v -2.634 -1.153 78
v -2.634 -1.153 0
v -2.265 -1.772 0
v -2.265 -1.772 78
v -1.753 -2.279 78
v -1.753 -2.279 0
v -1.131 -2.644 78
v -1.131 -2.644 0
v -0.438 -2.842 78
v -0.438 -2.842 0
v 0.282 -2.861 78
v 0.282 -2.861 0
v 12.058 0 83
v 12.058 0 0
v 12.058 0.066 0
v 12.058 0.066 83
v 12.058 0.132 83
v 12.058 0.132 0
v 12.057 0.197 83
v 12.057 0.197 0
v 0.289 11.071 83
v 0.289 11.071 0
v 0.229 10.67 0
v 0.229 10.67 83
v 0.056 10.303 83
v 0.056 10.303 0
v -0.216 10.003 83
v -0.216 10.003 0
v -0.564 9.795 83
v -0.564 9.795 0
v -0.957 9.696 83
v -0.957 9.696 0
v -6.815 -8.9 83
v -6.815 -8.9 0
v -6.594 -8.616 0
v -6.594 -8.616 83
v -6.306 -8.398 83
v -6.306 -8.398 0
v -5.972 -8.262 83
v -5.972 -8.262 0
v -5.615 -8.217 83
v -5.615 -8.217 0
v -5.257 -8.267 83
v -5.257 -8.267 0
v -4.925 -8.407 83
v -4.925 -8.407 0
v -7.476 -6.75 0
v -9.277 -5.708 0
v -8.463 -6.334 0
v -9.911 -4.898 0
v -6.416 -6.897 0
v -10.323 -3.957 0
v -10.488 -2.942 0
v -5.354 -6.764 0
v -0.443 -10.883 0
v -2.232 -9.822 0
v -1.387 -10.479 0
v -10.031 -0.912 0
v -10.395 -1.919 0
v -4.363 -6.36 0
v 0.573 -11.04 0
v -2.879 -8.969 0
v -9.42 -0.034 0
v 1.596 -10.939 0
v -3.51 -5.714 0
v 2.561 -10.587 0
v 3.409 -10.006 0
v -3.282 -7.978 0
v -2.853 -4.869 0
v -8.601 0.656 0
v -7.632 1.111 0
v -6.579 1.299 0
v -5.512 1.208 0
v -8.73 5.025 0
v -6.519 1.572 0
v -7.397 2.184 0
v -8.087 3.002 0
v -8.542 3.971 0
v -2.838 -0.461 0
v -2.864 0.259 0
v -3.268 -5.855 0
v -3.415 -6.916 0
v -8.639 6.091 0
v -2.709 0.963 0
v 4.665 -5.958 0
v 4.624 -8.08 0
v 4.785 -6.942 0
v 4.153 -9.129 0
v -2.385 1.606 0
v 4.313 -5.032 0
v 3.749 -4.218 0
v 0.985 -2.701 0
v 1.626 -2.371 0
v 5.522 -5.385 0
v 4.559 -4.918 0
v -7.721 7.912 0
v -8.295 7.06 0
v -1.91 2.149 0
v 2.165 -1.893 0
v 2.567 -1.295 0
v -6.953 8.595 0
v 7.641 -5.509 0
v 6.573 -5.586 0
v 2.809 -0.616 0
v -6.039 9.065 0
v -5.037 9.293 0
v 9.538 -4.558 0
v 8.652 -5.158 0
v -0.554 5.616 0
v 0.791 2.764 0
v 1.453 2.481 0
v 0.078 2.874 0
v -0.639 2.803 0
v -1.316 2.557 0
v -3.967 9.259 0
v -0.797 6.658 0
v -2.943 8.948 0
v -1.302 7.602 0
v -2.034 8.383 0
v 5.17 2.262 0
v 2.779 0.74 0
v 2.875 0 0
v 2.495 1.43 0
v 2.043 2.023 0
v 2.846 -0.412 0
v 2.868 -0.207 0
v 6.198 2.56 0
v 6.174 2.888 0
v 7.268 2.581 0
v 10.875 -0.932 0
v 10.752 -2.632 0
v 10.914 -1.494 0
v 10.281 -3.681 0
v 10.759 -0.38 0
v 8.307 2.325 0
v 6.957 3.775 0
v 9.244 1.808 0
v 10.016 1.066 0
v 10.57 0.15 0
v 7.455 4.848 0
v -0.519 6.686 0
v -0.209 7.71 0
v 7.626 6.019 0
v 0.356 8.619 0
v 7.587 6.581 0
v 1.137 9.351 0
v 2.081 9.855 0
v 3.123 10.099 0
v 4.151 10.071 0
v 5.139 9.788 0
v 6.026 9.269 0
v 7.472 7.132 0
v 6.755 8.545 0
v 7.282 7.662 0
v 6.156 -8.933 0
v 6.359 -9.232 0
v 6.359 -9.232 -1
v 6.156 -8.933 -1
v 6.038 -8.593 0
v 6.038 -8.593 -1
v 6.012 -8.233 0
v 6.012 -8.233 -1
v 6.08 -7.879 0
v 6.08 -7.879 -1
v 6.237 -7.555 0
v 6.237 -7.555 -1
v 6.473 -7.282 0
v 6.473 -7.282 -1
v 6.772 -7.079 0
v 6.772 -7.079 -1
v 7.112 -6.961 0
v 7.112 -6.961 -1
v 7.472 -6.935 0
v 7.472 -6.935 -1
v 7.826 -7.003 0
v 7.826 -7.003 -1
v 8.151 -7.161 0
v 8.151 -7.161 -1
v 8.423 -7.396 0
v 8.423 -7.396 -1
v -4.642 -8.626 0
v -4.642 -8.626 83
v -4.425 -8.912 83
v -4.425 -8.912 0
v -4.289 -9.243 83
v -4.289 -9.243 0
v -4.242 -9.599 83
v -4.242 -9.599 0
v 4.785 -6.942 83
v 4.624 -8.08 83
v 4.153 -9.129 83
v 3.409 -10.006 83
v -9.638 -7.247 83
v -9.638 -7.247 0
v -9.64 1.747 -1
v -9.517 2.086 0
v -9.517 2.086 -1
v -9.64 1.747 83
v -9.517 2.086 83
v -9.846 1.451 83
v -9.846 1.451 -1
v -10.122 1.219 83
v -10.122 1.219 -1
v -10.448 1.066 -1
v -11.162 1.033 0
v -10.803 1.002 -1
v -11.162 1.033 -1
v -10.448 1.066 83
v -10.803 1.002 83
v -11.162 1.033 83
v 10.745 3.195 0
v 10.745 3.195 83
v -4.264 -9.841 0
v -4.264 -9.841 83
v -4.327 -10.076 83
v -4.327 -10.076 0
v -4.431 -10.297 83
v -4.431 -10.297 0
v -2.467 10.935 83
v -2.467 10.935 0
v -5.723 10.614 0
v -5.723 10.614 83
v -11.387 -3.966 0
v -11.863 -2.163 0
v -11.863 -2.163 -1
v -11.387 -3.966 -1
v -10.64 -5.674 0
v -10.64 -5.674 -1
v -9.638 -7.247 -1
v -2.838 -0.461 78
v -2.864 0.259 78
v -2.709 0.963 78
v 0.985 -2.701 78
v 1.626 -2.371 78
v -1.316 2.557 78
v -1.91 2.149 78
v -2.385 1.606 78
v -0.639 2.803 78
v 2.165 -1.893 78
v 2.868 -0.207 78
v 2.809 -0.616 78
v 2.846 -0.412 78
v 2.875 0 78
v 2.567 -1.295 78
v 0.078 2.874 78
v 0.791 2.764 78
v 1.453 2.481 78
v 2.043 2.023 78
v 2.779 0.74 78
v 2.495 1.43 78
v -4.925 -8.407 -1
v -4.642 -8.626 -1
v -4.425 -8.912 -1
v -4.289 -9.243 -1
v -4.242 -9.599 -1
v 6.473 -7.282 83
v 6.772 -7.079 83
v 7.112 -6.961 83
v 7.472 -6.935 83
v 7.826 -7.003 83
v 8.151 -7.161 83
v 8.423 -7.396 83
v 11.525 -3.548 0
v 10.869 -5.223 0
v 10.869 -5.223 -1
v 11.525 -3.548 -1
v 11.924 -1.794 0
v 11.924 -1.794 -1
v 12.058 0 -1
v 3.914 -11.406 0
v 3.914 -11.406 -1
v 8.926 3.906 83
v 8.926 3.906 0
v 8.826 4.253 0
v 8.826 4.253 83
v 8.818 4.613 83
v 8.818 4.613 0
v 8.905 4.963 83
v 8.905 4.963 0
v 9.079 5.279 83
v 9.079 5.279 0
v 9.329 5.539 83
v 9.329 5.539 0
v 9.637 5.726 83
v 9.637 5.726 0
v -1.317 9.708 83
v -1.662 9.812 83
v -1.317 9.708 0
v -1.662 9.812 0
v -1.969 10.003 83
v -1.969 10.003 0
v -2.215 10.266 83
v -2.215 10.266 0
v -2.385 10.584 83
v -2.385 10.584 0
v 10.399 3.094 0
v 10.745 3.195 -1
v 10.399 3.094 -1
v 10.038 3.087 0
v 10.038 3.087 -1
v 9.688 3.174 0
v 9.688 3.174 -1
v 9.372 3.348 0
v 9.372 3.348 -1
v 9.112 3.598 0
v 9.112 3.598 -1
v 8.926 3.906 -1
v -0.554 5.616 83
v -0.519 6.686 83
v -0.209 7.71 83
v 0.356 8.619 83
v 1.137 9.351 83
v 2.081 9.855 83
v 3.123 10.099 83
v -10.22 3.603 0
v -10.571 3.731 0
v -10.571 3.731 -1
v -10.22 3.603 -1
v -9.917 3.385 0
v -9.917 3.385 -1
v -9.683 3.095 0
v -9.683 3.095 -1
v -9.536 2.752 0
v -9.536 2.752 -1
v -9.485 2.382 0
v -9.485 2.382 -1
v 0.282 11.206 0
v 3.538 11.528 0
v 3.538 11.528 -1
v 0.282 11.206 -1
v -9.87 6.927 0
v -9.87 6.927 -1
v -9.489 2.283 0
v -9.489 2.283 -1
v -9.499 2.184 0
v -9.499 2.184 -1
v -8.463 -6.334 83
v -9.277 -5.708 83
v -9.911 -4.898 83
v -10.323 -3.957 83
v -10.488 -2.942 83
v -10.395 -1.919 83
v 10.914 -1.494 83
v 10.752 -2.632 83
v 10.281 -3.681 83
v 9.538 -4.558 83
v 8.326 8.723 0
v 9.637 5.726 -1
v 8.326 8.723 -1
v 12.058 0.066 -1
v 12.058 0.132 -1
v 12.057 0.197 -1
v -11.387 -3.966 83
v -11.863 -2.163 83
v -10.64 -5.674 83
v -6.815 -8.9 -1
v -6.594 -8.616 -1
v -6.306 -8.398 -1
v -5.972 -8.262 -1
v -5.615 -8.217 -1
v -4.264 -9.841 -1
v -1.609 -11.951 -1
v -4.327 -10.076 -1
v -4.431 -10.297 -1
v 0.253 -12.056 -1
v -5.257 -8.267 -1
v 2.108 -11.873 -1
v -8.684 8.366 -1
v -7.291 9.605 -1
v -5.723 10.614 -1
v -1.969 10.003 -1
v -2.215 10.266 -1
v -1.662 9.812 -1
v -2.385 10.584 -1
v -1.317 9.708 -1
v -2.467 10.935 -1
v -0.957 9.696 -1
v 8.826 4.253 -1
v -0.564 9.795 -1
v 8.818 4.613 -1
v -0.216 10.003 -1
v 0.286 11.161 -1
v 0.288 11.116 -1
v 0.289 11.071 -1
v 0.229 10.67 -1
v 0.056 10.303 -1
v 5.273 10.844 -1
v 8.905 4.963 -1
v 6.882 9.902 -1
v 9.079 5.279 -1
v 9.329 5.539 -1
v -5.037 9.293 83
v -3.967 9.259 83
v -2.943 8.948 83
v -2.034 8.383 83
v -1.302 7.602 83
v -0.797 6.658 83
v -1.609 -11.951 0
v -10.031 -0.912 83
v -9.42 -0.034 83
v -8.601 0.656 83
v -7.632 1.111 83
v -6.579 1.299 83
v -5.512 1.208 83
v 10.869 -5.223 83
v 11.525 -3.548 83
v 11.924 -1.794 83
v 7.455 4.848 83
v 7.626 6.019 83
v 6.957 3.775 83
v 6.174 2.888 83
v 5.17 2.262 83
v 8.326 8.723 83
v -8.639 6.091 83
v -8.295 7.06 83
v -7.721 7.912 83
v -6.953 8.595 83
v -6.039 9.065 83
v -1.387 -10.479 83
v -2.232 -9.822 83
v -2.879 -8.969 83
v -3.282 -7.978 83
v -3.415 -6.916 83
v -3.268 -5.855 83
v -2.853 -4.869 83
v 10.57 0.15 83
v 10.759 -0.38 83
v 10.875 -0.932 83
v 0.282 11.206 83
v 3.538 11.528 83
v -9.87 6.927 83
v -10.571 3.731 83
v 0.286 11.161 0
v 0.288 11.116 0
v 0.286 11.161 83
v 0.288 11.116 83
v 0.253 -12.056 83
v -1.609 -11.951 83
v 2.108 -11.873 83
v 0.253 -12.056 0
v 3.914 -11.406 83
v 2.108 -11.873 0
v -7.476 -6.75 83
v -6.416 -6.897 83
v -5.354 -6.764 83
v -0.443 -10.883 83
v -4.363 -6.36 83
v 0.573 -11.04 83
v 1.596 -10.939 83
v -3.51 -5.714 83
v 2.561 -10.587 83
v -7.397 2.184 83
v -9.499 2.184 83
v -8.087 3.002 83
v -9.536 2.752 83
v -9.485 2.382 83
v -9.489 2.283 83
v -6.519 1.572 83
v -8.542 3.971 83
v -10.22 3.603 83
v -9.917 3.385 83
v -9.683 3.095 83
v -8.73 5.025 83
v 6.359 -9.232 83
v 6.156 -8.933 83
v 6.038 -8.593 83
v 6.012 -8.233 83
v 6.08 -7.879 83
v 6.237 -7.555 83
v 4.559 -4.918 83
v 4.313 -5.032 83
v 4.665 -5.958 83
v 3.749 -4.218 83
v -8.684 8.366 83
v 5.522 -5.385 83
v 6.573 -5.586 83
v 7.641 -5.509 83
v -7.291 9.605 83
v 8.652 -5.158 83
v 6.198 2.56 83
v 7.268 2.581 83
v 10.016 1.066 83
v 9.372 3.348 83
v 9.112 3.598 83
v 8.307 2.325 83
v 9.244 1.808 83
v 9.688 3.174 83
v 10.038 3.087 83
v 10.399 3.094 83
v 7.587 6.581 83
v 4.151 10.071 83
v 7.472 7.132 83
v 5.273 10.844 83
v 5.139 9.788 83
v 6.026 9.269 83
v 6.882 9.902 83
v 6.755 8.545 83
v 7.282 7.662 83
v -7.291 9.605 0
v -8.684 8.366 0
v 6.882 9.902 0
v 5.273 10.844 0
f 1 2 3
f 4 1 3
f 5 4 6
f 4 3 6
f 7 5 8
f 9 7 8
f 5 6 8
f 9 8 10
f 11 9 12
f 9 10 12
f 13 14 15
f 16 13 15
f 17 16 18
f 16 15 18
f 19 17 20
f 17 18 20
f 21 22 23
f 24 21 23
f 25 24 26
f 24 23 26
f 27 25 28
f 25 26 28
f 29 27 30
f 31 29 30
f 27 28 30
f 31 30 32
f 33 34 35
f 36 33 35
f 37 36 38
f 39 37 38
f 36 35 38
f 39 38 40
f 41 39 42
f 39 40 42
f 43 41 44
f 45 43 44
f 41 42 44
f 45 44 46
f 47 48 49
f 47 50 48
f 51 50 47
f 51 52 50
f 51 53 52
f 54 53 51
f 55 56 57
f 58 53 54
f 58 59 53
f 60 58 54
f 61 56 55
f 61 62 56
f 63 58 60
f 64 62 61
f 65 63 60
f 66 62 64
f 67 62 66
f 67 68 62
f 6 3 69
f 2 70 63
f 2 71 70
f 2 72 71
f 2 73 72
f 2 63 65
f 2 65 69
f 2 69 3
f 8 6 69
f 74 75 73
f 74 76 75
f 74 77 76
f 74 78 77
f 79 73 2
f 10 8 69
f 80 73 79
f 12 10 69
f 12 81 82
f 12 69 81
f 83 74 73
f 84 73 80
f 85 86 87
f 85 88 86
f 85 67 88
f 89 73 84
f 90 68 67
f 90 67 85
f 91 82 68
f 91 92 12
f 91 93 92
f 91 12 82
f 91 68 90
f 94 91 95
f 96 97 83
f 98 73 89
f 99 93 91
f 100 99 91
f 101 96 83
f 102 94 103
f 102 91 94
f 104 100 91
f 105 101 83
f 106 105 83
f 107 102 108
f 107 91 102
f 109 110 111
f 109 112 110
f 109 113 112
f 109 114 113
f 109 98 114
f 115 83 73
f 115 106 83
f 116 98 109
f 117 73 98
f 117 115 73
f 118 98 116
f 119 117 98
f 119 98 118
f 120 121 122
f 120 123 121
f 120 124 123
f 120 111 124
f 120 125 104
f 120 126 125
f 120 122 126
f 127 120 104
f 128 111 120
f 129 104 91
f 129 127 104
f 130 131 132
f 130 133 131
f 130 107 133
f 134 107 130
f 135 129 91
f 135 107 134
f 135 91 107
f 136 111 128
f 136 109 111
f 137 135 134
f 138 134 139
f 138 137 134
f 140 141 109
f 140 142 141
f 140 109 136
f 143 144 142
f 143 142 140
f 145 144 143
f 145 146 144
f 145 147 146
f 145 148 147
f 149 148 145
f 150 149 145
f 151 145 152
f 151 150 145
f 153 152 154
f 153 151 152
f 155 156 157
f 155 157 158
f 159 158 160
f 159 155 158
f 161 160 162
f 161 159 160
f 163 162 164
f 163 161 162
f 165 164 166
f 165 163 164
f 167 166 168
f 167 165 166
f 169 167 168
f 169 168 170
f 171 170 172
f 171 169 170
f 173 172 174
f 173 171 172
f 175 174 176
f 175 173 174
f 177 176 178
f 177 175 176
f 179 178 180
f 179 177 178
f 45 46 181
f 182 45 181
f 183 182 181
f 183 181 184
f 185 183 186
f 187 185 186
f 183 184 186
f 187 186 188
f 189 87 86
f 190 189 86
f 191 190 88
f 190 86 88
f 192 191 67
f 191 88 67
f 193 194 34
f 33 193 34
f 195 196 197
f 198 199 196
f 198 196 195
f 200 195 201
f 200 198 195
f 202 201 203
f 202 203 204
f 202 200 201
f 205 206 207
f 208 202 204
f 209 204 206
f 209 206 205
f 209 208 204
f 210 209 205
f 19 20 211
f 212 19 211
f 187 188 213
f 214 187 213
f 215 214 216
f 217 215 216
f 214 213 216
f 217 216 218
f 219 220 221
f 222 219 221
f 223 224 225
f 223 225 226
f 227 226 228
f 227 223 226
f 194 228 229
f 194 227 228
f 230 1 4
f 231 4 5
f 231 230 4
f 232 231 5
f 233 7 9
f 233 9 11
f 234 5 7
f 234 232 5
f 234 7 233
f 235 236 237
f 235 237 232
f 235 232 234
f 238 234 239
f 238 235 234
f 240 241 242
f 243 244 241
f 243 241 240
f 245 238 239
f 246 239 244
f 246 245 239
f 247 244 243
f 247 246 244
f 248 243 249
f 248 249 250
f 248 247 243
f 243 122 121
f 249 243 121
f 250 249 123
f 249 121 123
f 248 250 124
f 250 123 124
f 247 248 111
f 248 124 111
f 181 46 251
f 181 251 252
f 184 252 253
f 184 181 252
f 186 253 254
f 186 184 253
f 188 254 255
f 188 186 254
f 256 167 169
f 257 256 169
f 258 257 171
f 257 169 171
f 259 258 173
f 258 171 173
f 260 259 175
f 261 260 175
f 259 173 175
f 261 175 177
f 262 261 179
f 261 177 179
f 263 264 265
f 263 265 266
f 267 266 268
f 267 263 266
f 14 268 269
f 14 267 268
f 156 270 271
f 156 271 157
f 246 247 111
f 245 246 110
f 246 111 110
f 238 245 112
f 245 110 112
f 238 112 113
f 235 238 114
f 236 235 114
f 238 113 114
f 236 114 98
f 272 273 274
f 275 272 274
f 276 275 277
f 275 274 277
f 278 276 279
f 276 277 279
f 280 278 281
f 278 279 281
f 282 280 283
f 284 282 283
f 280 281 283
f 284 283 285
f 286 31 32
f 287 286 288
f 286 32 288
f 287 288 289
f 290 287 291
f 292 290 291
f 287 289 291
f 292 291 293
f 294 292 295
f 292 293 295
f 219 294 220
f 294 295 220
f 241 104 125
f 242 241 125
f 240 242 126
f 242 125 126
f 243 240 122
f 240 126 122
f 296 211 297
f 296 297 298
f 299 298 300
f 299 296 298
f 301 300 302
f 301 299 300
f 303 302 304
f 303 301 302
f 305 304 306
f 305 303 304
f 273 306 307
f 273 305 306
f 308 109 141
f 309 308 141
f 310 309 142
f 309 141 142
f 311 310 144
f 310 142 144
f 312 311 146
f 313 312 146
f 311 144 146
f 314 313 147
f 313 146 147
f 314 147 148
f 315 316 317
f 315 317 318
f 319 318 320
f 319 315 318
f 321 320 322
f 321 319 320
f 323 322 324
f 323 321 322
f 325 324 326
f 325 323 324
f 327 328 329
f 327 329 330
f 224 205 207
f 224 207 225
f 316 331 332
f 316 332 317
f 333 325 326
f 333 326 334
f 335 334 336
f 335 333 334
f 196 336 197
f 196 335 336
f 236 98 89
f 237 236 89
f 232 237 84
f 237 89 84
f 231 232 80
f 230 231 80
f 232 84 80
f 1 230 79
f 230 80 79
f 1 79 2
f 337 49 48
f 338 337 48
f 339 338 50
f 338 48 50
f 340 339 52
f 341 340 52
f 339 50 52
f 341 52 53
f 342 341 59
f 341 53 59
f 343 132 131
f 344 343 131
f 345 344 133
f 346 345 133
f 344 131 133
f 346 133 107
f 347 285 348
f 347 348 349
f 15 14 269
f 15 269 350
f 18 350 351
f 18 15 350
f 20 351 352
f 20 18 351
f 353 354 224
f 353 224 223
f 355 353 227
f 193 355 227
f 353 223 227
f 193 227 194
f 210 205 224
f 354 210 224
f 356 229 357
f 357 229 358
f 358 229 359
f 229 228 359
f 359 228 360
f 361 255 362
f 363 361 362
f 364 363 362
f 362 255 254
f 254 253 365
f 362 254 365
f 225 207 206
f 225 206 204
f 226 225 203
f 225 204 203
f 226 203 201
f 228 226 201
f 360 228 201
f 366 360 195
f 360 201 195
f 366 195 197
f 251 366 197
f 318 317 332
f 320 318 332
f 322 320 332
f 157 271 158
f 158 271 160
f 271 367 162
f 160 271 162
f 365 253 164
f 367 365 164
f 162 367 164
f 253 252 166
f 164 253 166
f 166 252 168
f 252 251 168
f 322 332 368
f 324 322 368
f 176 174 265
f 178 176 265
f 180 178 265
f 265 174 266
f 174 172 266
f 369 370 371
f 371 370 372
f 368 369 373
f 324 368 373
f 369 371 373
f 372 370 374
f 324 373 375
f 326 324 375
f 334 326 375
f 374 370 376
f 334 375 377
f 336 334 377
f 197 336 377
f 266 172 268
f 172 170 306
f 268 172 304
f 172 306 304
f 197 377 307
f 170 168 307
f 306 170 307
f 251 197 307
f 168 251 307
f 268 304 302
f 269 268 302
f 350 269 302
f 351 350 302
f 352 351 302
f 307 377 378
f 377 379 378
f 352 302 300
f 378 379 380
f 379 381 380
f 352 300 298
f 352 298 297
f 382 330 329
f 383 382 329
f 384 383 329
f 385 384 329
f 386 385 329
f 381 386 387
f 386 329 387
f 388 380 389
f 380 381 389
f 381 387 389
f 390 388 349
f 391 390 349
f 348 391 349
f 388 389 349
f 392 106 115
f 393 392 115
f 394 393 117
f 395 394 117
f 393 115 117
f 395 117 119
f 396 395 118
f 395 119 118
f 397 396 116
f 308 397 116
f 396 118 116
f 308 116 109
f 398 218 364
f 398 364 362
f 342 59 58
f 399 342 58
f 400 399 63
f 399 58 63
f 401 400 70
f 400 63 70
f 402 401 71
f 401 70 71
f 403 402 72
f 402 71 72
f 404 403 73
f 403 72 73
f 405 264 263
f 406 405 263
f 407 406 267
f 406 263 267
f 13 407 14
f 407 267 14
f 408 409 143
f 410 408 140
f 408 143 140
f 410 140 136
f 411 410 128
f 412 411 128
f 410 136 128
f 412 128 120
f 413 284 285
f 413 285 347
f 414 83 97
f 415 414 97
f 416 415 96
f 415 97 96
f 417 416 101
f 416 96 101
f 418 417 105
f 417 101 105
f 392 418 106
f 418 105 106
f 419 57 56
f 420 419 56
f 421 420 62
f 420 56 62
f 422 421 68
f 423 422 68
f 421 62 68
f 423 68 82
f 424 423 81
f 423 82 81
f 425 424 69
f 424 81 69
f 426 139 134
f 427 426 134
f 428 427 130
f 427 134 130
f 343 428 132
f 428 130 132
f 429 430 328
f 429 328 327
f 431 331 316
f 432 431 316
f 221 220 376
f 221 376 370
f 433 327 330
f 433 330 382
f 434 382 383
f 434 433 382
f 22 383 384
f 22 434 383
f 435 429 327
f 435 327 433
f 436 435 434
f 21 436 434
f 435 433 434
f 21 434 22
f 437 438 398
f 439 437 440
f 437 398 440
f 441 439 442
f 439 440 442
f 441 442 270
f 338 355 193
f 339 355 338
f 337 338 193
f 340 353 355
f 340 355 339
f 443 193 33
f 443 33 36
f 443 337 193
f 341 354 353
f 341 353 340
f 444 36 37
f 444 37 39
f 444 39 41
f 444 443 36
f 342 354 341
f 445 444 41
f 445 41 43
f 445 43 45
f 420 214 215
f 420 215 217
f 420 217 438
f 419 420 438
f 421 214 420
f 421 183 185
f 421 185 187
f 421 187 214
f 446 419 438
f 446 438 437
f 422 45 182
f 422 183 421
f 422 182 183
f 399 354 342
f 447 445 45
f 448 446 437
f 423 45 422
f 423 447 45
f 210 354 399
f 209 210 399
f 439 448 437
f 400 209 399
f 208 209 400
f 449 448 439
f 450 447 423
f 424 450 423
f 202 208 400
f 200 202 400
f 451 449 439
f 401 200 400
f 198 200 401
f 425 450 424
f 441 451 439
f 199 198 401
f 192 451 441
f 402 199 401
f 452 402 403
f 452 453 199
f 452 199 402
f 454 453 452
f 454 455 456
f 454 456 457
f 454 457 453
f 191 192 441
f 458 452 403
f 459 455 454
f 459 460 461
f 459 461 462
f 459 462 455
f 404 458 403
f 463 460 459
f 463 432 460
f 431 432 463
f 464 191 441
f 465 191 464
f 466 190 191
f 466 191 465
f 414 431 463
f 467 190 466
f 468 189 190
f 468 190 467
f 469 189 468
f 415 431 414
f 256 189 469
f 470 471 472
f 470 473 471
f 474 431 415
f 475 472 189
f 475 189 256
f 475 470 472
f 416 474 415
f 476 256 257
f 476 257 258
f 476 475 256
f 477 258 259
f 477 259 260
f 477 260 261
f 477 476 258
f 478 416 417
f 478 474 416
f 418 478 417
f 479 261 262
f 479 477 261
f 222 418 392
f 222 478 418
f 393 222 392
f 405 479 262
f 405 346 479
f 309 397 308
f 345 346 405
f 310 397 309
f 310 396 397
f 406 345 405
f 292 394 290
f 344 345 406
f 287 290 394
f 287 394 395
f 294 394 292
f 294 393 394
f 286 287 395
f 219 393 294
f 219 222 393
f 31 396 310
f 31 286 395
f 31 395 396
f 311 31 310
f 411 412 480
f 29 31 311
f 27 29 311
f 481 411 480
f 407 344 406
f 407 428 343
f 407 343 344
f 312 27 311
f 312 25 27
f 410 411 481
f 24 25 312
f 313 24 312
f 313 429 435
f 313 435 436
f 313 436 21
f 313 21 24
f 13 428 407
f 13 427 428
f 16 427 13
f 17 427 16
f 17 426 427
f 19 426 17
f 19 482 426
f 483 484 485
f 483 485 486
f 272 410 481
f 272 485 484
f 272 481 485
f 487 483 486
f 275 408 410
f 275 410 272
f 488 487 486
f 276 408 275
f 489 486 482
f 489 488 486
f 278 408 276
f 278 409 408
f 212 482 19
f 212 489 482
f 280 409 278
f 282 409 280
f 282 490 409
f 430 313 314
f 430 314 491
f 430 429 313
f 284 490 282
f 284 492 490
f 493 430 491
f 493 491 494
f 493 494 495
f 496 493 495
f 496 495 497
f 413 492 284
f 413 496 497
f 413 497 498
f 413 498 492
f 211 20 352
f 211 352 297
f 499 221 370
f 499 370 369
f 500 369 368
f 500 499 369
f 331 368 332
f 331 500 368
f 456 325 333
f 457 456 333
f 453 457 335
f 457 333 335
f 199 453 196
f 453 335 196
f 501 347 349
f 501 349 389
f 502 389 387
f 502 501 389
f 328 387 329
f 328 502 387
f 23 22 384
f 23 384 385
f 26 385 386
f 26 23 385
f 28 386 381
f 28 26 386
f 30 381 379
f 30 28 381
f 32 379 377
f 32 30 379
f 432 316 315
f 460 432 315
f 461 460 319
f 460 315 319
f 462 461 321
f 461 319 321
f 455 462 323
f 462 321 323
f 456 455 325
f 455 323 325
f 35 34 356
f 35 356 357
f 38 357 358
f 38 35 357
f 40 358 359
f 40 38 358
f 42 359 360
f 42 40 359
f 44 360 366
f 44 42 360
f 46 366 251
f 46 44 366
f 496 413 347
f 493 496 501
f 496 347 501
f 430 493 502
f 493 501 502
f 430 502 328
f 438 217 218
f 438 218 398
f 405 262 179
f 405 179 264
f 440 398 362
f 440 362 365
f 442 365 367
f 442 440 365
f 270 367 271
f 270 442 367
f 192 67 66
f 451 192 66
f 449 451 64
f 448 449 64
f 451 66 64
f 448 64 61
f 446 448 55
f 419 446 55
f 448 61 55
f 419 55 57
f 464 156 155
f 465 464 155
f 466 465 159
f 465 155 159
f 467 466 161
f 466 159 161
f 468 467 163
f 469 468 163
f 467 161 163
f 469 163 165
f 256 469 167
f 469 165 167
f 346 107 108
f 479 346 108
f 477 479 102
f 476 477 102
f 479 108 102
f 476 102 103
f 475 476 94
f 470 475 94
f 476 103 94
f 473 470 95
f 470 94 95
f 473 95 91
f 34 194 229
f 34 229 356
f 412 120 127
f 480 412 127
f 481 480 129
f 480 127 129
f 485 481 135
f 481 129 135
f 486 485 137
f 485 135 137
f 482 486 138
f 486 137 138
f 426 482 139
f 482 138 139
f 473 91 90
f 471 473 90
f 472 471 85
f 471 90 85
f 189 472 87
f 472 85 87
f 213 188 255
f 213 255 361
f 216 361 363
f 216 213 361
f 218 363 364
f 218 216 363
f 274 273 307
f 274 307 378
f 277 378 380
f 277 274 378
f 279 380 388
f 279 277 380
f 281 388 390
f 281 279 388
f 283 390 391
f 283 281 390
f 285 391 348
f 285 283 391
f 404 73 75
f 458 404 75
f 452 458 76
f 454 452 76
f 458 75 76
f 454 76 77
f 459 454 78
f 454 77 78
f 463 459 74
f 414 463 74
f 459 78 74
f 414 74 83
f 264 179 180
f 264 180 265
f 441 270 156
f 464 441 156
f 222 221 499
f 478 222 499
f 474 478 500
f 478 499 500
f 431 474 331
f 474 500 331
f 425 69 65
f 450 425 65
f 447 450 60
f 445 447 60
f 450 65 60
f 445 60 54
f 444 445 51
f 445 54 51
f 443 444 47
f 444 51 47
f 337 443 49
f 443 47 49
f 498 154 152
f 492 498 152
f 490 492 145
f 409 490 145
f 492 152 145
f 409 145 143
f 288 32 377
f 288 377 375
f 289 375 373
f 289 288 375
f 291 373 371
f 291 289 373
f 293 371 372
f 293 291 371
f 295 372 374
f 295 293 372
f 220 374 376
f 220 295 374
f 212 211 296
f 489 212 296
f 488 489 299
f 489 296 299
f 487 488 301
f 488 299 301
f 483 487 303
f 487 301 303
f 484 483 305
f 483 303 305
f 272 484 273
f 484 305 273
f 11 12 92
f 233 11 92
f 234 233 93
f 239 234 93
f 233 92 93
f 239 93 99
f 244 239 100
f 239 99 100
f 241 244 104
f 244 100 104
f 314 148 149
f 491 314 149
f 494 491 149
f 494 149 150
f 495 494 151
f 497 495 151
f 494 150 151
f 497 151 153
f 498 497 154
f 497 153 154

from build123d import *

# Parameters (mm, degrees)
F1_DEPTH = 83
F2_DEPTH = 1
F3_DEPTH = 78


with BuildPart() as f1:
    # F0 (on Top) → F1 (new body)
    with BuildSketch(Plane.XY):
        with BuildLine():
            Line((-10.3950891863, -1.9186980107), (-9.5171950704, 2.0862116958))
            ThreePointArc((-9.5171950704, 2.0862116958), (-10.1215255896, 1.2187611374), (-11.1622319686, 1.0327071659))
            Line((-11.1622319686, 1.0327071659), (-11.8627554285, -2.163046346))
            ThreePointArc((-11.8627554285, -2.163046346), (-11.0467790087, -4.8345019791), (-9.6380226836, -7.2465339717))
            Line((-9.6380226836, -7.2465339717), (-6.8151541357, -8.900313518))
            ThreePointArc((-6.8151541357, -8.900313518), (-5.9723446863, -8.2620673961), (-4.9250802493, -8.4067155171))
            Line((-4.9250802493, -8.4067155171), (-8.4626915502, -6.3342034206))
            ThreePointArc((-8.4626915502, -6.3342034206), (-10.1462327065, -4.4403877421), (-10.3950891863, -1.9186980107))
        make_face()
        with BuildLine():
            Line((-1.3874689708, -10.4792276005), (-4.9250802493, -8.4067155171))
            ThreePointArc((-4.9250802493, -8.4067155171), (-4.4248837763, -8.9117006172), (-4.2420111599, -9.5985514519))
            ThreePointArc((-4.2420111599, -9.5985514519), (-4.290220206, -9.9602956665), (-4.431482253, -10.2967893857))
            Line((-4.431482253, -10.2967893857), (-1.6086137051, -11.950568932))
            ThreePointArc((-1.6086137051, -11.950568932), (1.1842421634, -12.0000544311), (3.9135505529, -11.405606425))
            Line((3.9135505529, -11.405606425), (6.3587027212, -9.2319448826))
            ThreePointArc((6.3587027212, -9.2319448826), (6.0121370154, -8.2331568272), (6.4733276858, -7.2818479742))
            Line((6.4733276858, -7.2818479742), (3.4090699315, -10.005874447))
            ThreePointArc((3.4090699315, -10.005874447), (1.0877013618, -11.0217960053), (-1.3874689708, -10.4792276005))
        make_face()
        with BuildLine():
            ThreePointArc((-2.8525682403, -4.8691043398), (-5.3541979477, -6.7635484333), (-8.4626915502, -6.3342034206))
            Line((-8.4626915502, -6.3342034206), (-4.9250802493, -8.4067155171))
            Line((-4.9250802493, -8.4067155171), (-1.3874689708, -10.4792276005))
            ThreePointArc((-1.3874689708, -10.4792276005), (-3.2819131484, -7.9775979567), (-2.8525682403, -4.8691043398))
        make_face()
        with BuildLine():
            ThreePointArc((9.537586204, -4.5578208223), (6.5729795774, -5.5864982283), (3.7493013379, -4.2175895912))
            ThreePointArc((3.7493013379, -4.2175895912), (4.5173700035, -5.4844716194), (4.7850431192, -6.9416163107))
            ThreePointArc((4.7850431192, -6.9416163107), (4.4252643647, -8.6211236893), (3.4090699315, -10.005874447))
            Line((3.4090699315, -10.005874447), (6.4733276858, -7.2818479742))
            Line((6.4733276858, -7.2818479742), (9.537586204, -4.5578208223))
        make_face()
        with BuildLine():
            Line((8.9258170342, 3.9062861541), (7.2820214155, 7.6623394177))
            ThreePointArc((7.2820214155, 7.6623394177), (7.5390603878, 6.8582406834), (7.6259681692, 6.0185438065))
            ThreePointArc((7.6259681692, 6.0185438065), (6.9574082172, 3.7746143965), (5.1697636829, 2.2624905175))
            ThreePointArc((5.1697636829, 2.2624905175), (8.3071510394, 2.3247070778), (10.5696126379, 0.1502329252))
            Line((10.5696126379, 0.1502329252), (8.9258170342, 3.9062861541))
        make_face()
        with BuildLine():
            Line((-0.9568697851, 9.6960652567), (-5.0370494624, 9.2934070157))
            ThreePointArc((-5.0370494624, 9.2934070157), (-2.0339908159, 8.3830723867), (-0.5542115132, 5.6158854419))
            ThreePointArc((-0.5542115132, 5.6158854419), (0.3561230261, 8.6189441157), (3.1233099266, 10.098723501))
            Line((3.1233099266, 10.098723501), (-0.9568697851, 9.6960652567))
        make_face()
        with BuildLine():
            ThreePointArc((-5.5122853186, 1.2083175905), (-8.0870549248, 3.0020933722), (-8.6393009458, 6.0911214414))
            Line((-8.6393009458, 6.0911214414), (-9.5171950704, 2.0862116958))
            Line((-9.5171950704, 2.0862116958), (-10.3950891863, -1.9186980107))
            ThreePointArc((-10.3950891863, -1.9186980107), (-8.6013133908, 0.6560715859), (-5.5122853186, 1.2083175905))
        make_face()
        with BuildLine():
            ThreePointArc((-8.6393009458, 6.0911214414), (-7.3584180322, 8.2774854574), (-5.0370494624, 9.2934070157))
            Line((-5.0370494624, 9.2934070157), (-0.9568697851, 9.6960652567))
            ThreePointArc((-0.9568697851, 9.6960652567), (-1.9686126936, 10.0027607695), (-2.4671564939, 10.9350375146))
            Line((-2.4671564939, 10.9350375146), (-5.72297235, 10.6137327709))
            ThreePointArc((-5.72297235, 10.6137327709), (-8.011527057, 9.0121678894), (-9.8701761557, 6.9270021298))
            Line((-9.8701761557, 6.9270021298), (-10.5706996156, 3.7312486179))
            ThreePointArc((-10.5706996156, 3.7312486179), (-9.7902332374, 3.2478489051), (-9.4851587577, 2.3819778919))
            ThreePointArc((-9.4851587577, 2.3819778919), (-9.4931911905, 2.2332298095), (-9.5171950704, 2.0862116958))
            Line((-9.5171950704, 2.0862116958), (-8.6393009458, 6.0911214414))
        make_face()
        with BuildLine():
            ThreePointArc((0.2887800316, 11.0706947495), (-0.0689564404, 10.1431644658), (-0.9568697851, 9.6960652567))
            Line((-0.9568697851, 9.6960652567), (3.1233099266, 10.098723501))
            ThreePointArc((3.1233099266, 10.098723501), (5.5984802592, 9.5561550962), (7.2820214155, 7.6623394177))
            Line((7.2820214155, 7.6623394177), (8.9258170342, 3.9062861541))
            ThreePointArc((8.9258170342, 3.9062861541), (8.9048560265, 4.9632849819), (9.6374453998, 5.7255176864))
            Line((9.6374453998, 5.7255176864), (8.3257639995, 8.722693946))
            ThreePointArc((8.3257639995, 8.722693946), (6.0953829856, 10.404328047), (3.5379183444, 11.5276567281))
            Line((3.5379183444, 11.5276567281), (0.2821024884, 11.2063519844))
            ThreePointArc((0.2821024884, 11.2063519844), (0.2871096358, 11.1386054905), (0.2887800316, 11.0706947495))
        make_face()
        with BuildLine():
            ThreePointArc((10.7450485417, 3.1946577983), (9.6880497312, 3.1736967981), (8.9258170342, 3.9062861541))
            Line((8.9258170342, 3.9062861541), (10.5696126379, 0.1502329252))
            ThreePointArc((10.5696126379, 0.1502329252), (10.8266516102, -0.653865809), (10.9135593917, -1.493562686))
            ThreePointArc((10.9135593917, -1.493562686), (10.5537806372, -3.1730700646), (9.537586204, -4.5578208223))
            Line((9.537586204, -4.5578208223), (6.4733276858, -7.2818479742))
            ThreePointArc((6.4733276858, -7.2818479742), (7.4721161232, -6.9352819289), (8.4234253157, -7.3964729812))
            Line((8.4234253157, -7.3964729812), (10.868577484, -5.2228114389))
            ThreePointArc((10.868577484, -5.2228114389), (11.7571428527, -2.6783068892), (12.0583471443, 0))
            ThreePointArc((12.0583471443, 0), (12.0579428369, 0.0987440802), (12.056729942, 0.1974815387))
            Line((12.056729942, 0.1974815387), (10.7450485417, 3.1946577983))
        make_face()
    extrude(amount=F1_DEPTH)

    # F0 (on Top) → F2 (join)
    with BuildSketch(Plane.XY):
        with BuildLine():
            Line((-10.3950891863, -1.9186980107), (-9.5171950704, 2.0862116958))
            ThreePointArc((-9.5171950704, 2.0862116958), (-10.1215255896, 1.2187611374), (-11.1622319686, 1.0327071659))
            Line((-11.1622319686, 1.0327071659), (-11.8627554285, -2.163046346))
            ThreePointArc((-11.8627554285, -2.163046346), (-11.0467790087, -4.8345019791), (-9.6380226836, -7.2465339717))
            Line((-9.6380226836, -7.2465339717), (-6.8151541357, -8.900313518))
            ThreePointArc((-6.8151541357, -8.900313518), (-5.9723446863, -8.2620673961), (-4.9250802493, -8.4067155171))
            Line((-4.9250802493, -8.4067155171), (-8.4626915502, -6.3342034206))
            ThreePointArc((-8.4626915502, -6.3342034206), (-10.1462327065, -4.4403877421), (-10.3950891863, -1.9186980107))
        make_face()
        with BuildLine():
            Line((-1.3874689708, -10.4792276005), (-4.9250802493, -8.4067155171))
            ThreePointArc((-4.9250802493, -8.4067155171), (-4.4248837763, -8.9117006172), (-4.2420111599, -9.5985514519))
            ThreePointArc((-4.2420111599, -9.5985514519), (-4.290220206, -9.9602956665), (-4.431482253, -10.2967893857))
            Line((-4.431482253, -10.2967893857), (-1.6086137051, -11.950568932))
            ThreePointArc((-1.6086137051, -11.950568932), (1.1842421634, -12.0000544311), (3.9135505529, -11.405606425))
            Line((3.9135505529, -11.405606425), (6.3587027212, -9.2319448826))
            ThreePointArc((6.3587027212, -9.2319448826), (6.0121370154, -8.2331568272), (6.4733276858, -7.2818479742))
            Line((6.4733276858, -7.2818479742), (3.4090699315, -10.005874447))
            ThreePointArc((3.4090699315, -10.005874447), (1.0877013618, -11.0217960053), (-1.3874689708, -10.4792276005))
        make_face()
        with BuildLine():
            ThreePointArc((-2.8525682403, -4.8691043398), (-5.3541979477, -6.7635484333), (-8.4626915502, -6.3342034206))
            Line((-8.4626915502, -6.3342034206), (-4.9250802493, -8.4067155171))
            Line((-4.9250802493, -8.4067155171), (-1.3874689708, -10.4792276005))
            ThreePointArc((-1.3874689708, -10.4792276005), (-3.2819131484, -7.9775979567), (-2.8525682403, -4.8691043398))
        make_face()
        with BuildLine():
            ThreePointArc((-2.6341262483, -1.1527964414), (-3.7897791282, 0.3732529936), (-5.5122853186, 1.2083175905))
            ThreePointArc((-5.5122853186, 1.2083175905), (-8.6013133908, 0.6560715859), (-10.3950891863, -1.9186980107))
            ThreePointArc((-10.3950891863, -1.9186980107), (-10.1462327065, -4.4403877421), (-8.4626915502, -6.3342034206))
            ThreePointArc((-8.4626915502, -6.3342034206), (-5.3541979477, -6.7635484333), (-2.8525682403, -4.8691043398))
            ThreePointArc((-2.8525682403, -4.8691043398), (-2.4332737246, -3.8703225435), (-2.2901794603, -2.7965921309))
            ThreePointArc((-2.2901794603, -2.7965921309), (-2.3770872504, -1.9568952121), (-2.6341262483, -1.1527964414))
        make_face()
        with BuildLine():
            ThreePointArc((2.8753366285, 0), (2.4946679145, 1.4297526792), (1.4534560019, 2.4809325621))
            ThreePointArc((1.4534560019, 2.4809325621), (-0.2823849464, 2.8614366093), (-1.9103644453, 2.1489691513))
            ThreePointArc((-1.9103644453, 2.1489691513), (-2.8086496619, 0.6156685828), (-2.6341262483, -1.1527964414))
            ThreePointArc((-2.6341262483, -1.1527964414), (-1.4534561135, -2.4809324967), (0.2823848827, -2.8614366156))
            ThreePointArc((0.2823848827, -2.8614366156), (1.9103644135, -2.1489691795), (2.8086496678, -0.6156685559))
            ThreePointArc((2.8086496678, -0.6156685559), (2.8586162731, -0.3096348339), (2.8753366285, 0))
        make_face()
        with BuildLine():
            ThreePointArc((9.537586204, -4.5578208223), (6.5729795774, -5.5864982283), (3.7493013379, -4.2175895912))
            ThreePointArc((3.7493013379, -4.2175895912), (4.5173700035, -5.4844716194), (4.7850431192, -6.9416163107))
            ThreePointArc((4.7850431192, -6.9416163107), (4.4252643647, -8.6211236893), (3.4090699315, -10.005874447))
            Line((3.4090699315, -10.005874447), (6.4733276858, -7.2818479742))
            Line((6.4733276858, -7.2818479742), (9.537586204, -4.5578208223))
        make_face()
        with BuildLine():
            ThreePointArc((2.8086496678, -0.6156685559), (1.9103644135, -2.1489691795), (0.2823848827, -2.8614366156))
            ThreePointArc((0.2823848827, -2.8614366156), (2.1786348772, -3.12334659), (3.7493013379, -4.2175895912))
            ThreePointArc((3.7493013379, -4.2175895912), (2.846603121, -2.5295443205), (2.8086496678, -0.6156685559))
        make_face()
        with BuildLine():
            ThreePointArc((3.7493013379, -4.2175895912), (2.1786348772, -3.12334659), (0.2823848827, -2.8614366156))
            ThreePointArc((0.2823848827, -2.8614366156), (-1.5260908761, -3.4889526354), (-2.8525682403, -4.8691043398))
            ThreePointArc((-2.8525682403, -4.8691043398), (-3.2819131484, -7.9775979567), (-1.3874689708, -10.4792276005))
            ThreePointArc((-1.3874689708, -10.4792276005), (1.0877013618, -11.0217960053), (3.4090699315, -10.005874447))
            ThreePointArc((3.4090699315, -10.005874447), (4.4252643647, -8.6211236893), (4.7850431192, -6.9416163107))
            ThreePointArc((4.7850431192, -6.9416163107), (4.5173700035, -5.4844716194), (3.7493013379, -4.2175895912))
        make_face()
        with BuildLine():
            ThreePointArc((10.5696126379, 0.1502329252), (8.3071510394, 2.3247070778), (5.1697636829, 2.2624905175))
            ThreePointArc((5.1697636829, 2.2624905175), (3.6437142568, 1.1068376333), (2.8086496678, -0.6156685559))
            ThreePointArc((2.8086496678, -0.6156685559), (2.846603121, -2.5295443205), (3.7493013379, -4.2175895912))
            ThreePointArc((3.7493013379, -4.2175895912), (6.5729795774, -5.5864982283), (9.537586204, -4.5578208223))
            ThreePointArc((9.537586204, -4.5578208223), (10.5537806372, -3.1730700646), (10.9135593917, -1.493562686))
            ThreePointArc((10.9135593917, -1.493562686), (10.8266516102, -0.653865809), (10.5696126379, 0.1502329252))
        make_face()
        with BuildLine():
            ThreePointArc((3.1233099266, 10.098723501), (0.3561230261, 8.6189441157), (-0.5542115132, 5.6158854419))
            ThreePointArc((-0.5542115132, 5.6158854419), (0.0733044672, 3.8074098529), (1.4534560019, 2.4809325621))
            ThreePointArc((1.4534560019, 2.4809325621), (3.285388195, 1.9256082736), (5.1697636829, 2.2624905175))
            ThreePointArc((5.1697636829, 2.2624905175), (6.9574082172, 3.7746143965), (7.6259681692, 6.0185438065))
            ThreePointArc((7.6259681692, 6.0185438065), (7.5390603878, 6.8582406834), (7.2820214155, 7.6623394177))
            ThreePointArc((7.2820214155, 7.6623394177), (5.5984802592, 9.5561550962), (3.1233099266, 10.098723501))
        make_face()
        with BuildLine():
            ThreePointArc((-0.5542115132, 5.6158854419), (-2.0339908159, 8.3830723867), (-5.0370494624, 9.2934070157))
            ThreePointArc((-5.0370494624, 9.2934070157), (-7.3584180322, 8.2774854574), (-8.6393009458, 6.0911214414))
            ThreePointArc((-8.6393009458, 6.0911214414), (-8.0870549248, 3.0020933722), (-5.5122853186, 1.2083175905))
            ThreePointArc((-5.5122853186, 1.2083175905), (-3.5984096544, 1.2462710325), (-1.9103644453, 2.1489691513))
            ThreePointArc((-1.9103644453, 2.1489691513), (-0.8941699847, 3.5337199196), (-0.5343912198, 5.2132273212))
            ThreePointArc((-0.5343912198, 5.2132273212), (-0.539349291, 5.4148001407), (-0.5542115132, 5.6158854419))
        make_face()
        with BuildLine():
            Line((8.9258170342, 3.9062861541), (7.2820214155, 7.6623394177))
            ThreePointArc((7.2820214155, 7.6623394177), (7.5390603878, 6.8582406834), (7.6259681692, 6.0185438065))
            ThreePointArc((7.6259681692, 6.0185438065), (6.9574082172, 3.7746143965), (5.1697636829, 2.2624905175))
            ThreePointArc((5.1697636829, 2.2624905175), (8.3071510394, 2.3247070778), (10.5696126379, 0.1502329252))
            Line((10.5696126379, 0.1502329252), (8.9258170342, 3.9062861541))
        make_face()
        with BuildLine():
            ThreePointArc((5.1697636829, 2.2624905175), (3.285388195, 1.9256082736), (1.4534560019, 2.4809325621))
            ThreePointArc((1.4534560019, 2.4809325621), (2.4946679145, 1.4297526792), (2.8753366285, 0))
            ThreePointArc((2.8753366285, 0), (2.8586162731, -0.3096348339), (2.8086496678, -0.6156685559))
            ThreePointArc((2.8086496678, -0.6156685559), (3.6437142568, 1.1068376333), (5.1697636829, 2.2624905175))
        make_face()
        with BuildLine():
            Line((-0.9568697851, 9.6960652567), (-5.0370494624, 9.2934070157))
            ThreePointArc((-5.0370494624, 9.2934070157), (-2.0339908159, 8.3830723867), (-0.5542115132, 5.6158854419))
            ThreePointArc((-0.5542115132, 5.6158854419), (0.3561230261, 8.6189441157), (3.1233099266, 10.098723501))
            Line((3.1233099266, 10.098723501), (-0.9568697851, 9.6960652567))
        make_face()
        with BuildLine():
            ThreePointArc((-5.5122853186, 1.2083175905), (-8.0870549248, 3.0020933722), (-8.6393009458, 6.0911214414))
            Line((-8.6393009458, 6.0911214414), (-9.5171950704, 2.0862116958))
            Line((-9.5171950704, 2.0862116958), (-10.3950891863, -1.9186980107))
            ThreePointArc((-10.3950891863, -1.9186980107), (-8.6013133908, 0.6560715859), (-5.5122853186, 1.2083175905))
        make_face()
        with BuildLine():
            ThreePointArc((-1.9103644453, 2.1489691513), (-3.5984096544, 1.2462710325), (-5.5122853186, 1.2083175905))
            ThreePointArc((-5.5122853186, 1.2083175905), (-3.7897791282, 0.3732529936), (-2.6341262483, -1.1527964414))
            ThreePointArc((-2.6341262483, -1.1527964414), (-2.8086496619, 0.6156685828), (-1.9103644453, 2.1489691513))
        make_face()
        with BuildLine():
            ThreePointArc((1.4534560019, 2.4809325621), (0.0733044672, 3.8074098529), (-0.5542115132, 5.6158854419))
            ThreePointArc((-0.5542115132, 5.6158854419), (-0.539349291, 5.4148001407), (-0.5343912198, 5.2132273212))
            ThreePointArc((-0.5343912198, 5.2132273212), (-0.8941699847, 3.5337199196), (-1.9103644453, 2.1489691513))
            ThreePointArc((-1.9103644453, 2.1489691513), (-0.2823849464, 2.8614366093), (1.4534560019, 2.4809325621))
        make_face()
        with BuildLine():
            ThreePointArc((0.2823848827, -2.8614366156), (-1.4534561135, -2.4809324967), (-2.6341262483, -1.1527964414))
            ThreePointArc((-2.6341262483, -1.1527964414), (-2.3770872504, -1.9568952121), (-2.2901794603, -2.7965921309))
            ThreePointArc((-2.2901794603, -2.7965921309), (-2.4332737246, -3.8703225435), (-2.8525682403, -4.8691043398))
            ThreePointArc((-2.8525682403, -4.8691043398), (-1.5260908761, -3.4889526354), (0.2823848827, -2.8614366156))
        make_face()
        with BuildLine():
            ThreePointArc((-8.6393009458, 6.0911214414), (-7.3584180322, 8.2774854574), (-5.0370494624, 9.2934070157))
            Line((-5.0370494624, 9.2934070157), (-0.9568697851, 9.6960652567))
            ThreePointArc((-0.9568697851, 9.6960652567), (-1.9686126936, 10.0027607695), (-2.4671564939, 10.9350375146))
            Line((-2.4671564939, 10.9350375146), (-5.72297235, 10.6137327709))
            ThreePointArc((-5.72297235, 10.6137327709), (-8.011527057, 9.0121678894), (-9.8701761557, 6.9270021298))
            Line((-9.8701761557, 6.9270021298), (-10.5706996156, 3.7312486179))
            ThreePointArc((-10.5706996156, 3.7312486179), (-9.7902332374, 3.2478489051), (-9.4851587577, 2.3819778919))
            ThreePointArc((-9.4851587577, 2.3819778919), (-9.4931911905, 2.2332298095), (-9.5171950704, 2.0862116958))
            Line((-9.5171950704, 2.0862116958), (-8.6393009458, 6.0911214414))
        make_face()
        with BuildLine():
            ThreePointArc((0.2887800316, 11.0706947495), (-0.0689564404, 10.1431644658), (-0.9568697851, 9.6960652567))
            Line((-0.9568697851, 9.6960652567), (3.1233099266, 10.098723501))
            ThreePointArc((3.1233099266, 10.098723501), (5.5984802592, 9.5561550962), (7.2820214155, 7.6623394177))
            Line((7.2820214155, 7.6623394177), (8.9258170342, 3.9062861541))
            ThreePointArc((8.9258170342, 3.9062861541), (8.9048560265, 4.9632849819), (9.6374453998, 5.7255176864))
            Line((9.6374453998, 5.7255176864), (8.3257639995, 8.722693946))
            ThreePointArc((8.3257639995, 8.722693946), (6.0953829856, 10.404328047), (3.5379183444, 11.5276567281))
            Line((3.5379183444, 11.5276567281), (0.2821024884, 11.2063519844))
            ThreePointArc((0.2821024884, 11.2063519844), (0.2871096358, 11.1386054905), (0.2887800316, 11.0706947495))
        make_face()
        with BuildLine():
            ThreePointArc((10.7450485417, 3.1946577983), (9.6880497312, 3.1736967981), (8.9258170342, 3.9062861541))
            Line((8.9258170342, 3.9062861541), (10.5696126379, 0.1502329252))
            ThreePointArc((10.5696126379, 0.1502329252), (10.8266516102, -0.653865809), (10.9135593917, -1.493562686))
            ThreePointArc((10.9135593917, -1.493562686), (10.5537806372, -3.1730700646), (9.537586204, -4.5578208223))
            Line((9.537586204, -4.5578208223), (6.4733276858, -7.2818479742))
            ThreePointArc((6.4733276858, -7.2818479742), (7.4721161232, -6.9352819289), (8.4234253157, -7.3964729812))
            Line((8.4234253157, -7.3964729812), (10.868577484, -5.2228114389))
            ThreePointArc((10.868577484, -5.2228114389), (11.7571428527, -2.6783068892), (12.0583471443, 0))
            ThreePointArc((12.0583471443, 0), (12.0579428369, 0.0987440802), (12.056729942, 0.1974815387))
            Line((12.056729942, 0.1974815387), (10.7450485417, 3.1946577983))
        make_face()
    extrude(amount=-F2_DEPTH)

    # F0 (on Top) → F3 (join)
    with BuildSketch(Plane.XY):
        with BuildLine():
            ThreePointArc((2.8753366285, 0), (2.4946679145, 1.4297526792), (1.4534560019, 2.4809325621))
            ThreePointArc((1.4534560019, 2.4809325621), (-0.2823849464, 2.8614366093), (-1.9103644453, 2.1489691513))
            ThreePointArc((-1.9103644453, 2.1489691513), (-2.8086496619, 0.6156685828), (-2.6341262483, -1.1527964414))
            ThreePointArc((-2.6341262483, -1.1527964414), (-1.4534561135, -2.4809324967), (0.2823848827, -2.8614366156))
            ThreePointArc((0.2823848827, -2.8614366156), (1.9103644135, -2.1489691795), (2.8086496678, -0.6156685559))
            ThreePointArc((2.8086496678, -0.6156685559), (2.8586162731, -0.3096348339), (2.8753366285, 0))
        make_face()
    extrude(amount=F3_DEPTH)


solid = f1.part
